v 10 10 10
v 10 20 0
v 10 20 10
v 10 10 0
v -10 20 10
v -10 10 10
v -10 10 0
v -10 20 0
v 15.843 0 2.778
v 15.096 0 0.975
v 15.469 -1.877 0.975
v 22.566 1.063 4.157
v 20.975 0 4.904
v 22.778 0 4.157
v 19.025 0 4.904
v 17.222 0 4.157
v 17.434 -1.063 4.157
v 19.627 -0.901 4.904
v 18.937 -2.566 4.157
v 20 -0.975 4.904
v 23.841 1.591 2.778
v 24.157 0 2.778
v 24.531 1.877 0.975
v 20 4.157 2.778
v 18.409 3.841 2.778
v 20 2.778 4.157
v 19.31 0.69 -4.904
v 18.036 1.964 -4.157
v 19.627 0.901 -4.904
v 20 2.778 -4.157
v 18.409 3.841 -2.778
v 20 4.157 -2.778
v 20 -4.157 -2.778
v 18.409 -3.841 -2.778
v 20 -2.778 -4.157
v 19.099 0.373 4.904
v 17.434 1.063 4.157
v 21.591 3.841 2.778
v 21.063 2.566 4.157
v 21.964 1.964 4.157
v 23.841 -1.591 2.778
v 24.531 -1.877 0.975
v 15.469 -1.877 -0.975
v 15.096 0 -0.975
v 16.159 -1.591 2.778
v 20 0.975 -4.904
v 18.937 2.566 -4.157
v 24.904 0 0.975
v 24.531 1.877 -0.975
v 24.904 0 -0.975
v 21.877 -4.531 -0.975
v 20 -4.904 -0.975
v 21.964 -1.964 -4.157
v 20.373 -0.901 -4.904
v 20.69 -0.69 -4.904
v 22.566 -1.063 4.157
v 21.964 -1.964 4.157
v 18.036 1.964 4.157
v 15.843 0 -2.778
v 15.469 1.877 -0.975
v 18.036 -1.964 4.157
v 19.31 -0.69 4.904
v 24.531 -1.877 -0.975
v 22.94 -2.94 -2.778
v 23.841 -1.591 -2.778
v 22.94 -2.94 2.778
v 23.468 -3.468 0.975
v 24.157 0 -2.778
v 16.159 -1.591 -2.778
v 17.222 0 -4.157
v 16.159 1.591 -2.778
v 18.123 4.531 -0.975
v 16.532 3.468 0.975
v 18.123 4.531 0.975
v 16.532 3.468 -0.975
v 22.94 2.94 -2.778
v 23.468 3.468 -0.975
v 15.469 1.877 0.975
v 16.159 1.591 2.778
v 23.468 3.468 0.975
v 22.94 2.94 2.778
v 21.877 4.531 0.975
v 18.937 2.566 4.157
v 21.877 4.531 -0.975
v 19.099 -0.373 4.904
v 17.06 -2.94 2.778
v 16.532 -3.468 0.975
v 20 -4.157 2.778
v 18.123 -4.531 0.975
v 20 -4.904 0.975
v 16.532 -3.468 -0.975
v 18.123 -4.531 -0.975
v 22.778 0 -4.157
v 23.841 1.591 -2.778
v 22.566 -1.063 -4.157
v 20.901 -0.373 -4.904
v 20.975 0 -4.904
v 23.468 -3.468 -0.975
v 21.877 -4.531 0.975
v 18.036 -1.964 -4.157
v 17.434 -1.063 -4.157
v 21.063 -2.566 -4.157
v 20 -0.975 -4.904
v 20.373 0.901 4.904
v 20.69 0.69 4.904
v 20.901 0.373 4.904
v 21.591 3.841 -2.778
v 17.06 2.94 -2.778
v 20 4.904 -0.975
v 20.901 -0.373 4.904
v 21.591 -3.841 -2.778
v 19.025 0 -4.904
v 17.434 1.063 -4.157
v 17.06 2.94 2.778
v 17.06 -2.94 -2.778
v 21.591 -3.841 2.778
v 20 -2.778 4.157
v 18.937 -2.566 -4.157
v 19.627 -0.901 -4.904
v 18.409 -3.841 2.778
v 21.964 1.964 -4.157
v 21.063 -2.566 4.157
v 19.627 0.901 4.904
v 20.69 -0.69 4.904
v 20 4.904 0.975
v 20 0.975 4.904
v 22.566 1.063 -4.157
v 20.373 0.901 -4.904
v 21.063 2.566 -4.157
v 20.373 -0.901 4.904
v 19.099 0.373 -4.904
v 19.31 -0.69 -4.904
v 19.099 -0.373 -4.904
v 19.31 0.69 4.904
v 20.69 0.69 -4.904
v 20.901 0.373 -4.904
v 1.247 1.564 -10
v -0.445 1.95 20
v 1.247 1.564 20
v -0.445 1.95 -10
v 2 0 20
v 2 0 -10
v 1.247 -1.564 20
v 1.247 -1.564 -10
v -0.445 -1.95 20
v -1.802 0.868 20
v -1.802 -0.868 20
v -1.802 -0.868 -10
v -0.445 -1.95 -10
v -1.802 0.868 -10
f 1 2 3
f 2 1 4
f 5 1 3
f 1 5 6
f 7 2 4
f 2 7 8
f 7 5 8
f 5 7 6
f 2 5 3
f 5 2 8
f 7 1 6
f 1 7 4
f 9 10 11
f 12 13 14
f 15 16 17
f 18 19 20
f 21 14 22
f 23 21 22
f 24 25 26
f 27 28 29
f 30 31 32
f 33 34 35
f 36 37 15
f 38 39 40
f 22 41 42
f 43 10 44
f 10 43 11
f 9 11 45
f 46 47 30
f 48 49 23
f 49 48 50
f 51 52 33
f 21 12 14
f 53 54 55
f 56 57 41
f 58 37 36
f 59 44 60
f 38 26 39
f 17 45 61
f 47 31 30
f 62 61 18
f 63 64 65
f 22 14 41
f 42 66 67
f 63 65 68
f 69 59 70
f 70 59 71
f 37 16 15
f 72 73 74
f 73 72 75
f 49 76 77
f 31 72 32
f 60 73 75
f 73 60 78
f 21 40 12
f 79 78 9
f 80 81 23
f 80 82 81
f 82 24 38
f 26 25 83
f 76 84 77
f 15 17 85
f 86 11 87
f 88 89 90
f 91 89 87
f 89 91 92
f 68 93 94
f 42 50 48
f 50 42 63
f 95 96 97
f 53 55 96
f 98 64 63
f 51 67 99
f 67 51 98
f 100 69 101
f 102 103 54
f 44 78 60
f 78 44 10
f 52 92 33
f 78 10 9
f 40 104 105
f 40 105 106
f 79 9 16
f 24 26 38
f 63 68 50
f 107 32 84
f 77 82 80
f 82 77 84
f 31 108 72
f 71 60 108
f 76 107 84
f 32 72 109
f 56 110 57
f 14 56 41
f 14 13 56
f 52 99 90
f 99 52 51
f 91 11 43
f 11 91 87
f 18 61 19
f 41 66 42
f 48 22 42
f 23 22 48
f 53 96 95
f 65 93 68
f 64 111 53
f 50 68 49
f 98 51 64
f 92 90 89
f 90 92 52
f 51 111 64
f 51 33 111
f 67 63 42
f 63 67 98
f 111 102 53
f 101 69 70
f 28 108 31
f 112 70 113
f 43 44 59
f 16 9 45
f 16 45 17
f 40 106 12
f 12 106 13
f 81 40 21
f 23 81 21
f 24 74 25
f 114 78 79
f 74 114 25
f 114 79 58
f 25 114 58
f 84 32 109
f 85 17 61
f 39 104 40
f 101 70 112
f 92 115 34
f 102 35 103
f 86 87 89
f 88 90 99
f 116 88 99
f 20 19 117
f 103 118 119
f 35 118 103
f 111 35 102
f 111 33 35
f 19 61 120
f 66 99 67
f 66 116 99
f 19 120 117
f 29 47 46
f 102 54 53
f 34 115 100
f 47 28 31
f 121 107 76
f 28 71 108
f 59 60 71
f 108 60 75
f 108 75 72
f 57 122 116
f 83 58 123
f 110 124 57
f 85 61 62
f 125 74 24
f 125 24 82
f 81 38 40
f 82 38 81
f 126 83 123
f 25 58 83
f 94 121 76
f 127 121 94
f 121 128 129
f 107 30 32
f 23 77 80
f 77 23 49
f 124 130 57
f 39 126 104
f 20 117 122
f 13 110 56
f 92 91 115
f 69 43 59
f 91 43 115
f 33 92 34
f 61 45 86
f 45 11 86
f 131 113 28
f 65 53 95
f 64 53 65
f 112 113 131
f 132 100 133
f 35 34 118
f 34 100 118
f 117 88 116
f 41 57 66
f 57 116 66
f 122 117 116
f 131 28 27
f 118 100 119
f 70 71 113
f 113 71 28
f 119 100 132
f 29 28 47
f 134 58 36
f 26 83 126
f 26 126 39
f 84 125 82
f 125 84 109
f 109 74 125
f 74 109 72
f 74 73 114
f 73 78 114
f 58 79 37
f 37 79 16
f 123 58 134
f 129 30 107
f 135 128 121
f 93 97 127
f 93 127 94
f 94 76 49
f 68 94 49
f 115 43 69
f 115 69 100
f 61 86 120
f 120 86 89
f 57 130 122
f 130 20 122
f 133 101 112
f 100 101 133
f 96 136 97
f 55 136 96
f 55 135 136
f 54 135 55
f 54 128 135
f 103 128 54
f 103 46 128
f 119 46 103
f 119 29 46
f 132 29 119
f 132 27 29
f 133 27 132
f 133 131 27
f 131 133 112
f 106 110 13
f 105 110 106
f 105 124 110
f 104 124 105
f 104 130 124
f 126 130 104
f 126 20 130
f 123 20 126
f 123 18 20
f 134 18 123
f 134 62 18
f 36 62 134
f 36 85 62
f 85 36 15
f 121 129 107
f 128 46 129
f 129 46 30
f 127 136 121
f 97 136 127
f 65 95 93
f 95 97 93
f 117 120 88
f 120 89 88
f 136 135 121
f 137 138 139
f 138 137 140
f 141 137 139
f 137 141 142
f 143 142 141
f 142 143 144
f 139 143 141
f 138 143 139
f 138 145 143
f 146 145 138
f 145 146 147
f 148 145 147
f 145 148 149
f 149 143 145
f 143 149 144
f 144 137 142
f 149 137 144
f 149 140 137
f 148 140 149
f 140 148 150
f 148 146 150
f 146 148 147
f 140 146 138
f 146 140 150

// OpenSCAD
translate([-10, 10, 0]) cube([20, 10, 10]);
translate([20, 0, 0]) sphere(5);
translate([0, 0, -10]) cylinder(h=30, r1=2, r2=2);
